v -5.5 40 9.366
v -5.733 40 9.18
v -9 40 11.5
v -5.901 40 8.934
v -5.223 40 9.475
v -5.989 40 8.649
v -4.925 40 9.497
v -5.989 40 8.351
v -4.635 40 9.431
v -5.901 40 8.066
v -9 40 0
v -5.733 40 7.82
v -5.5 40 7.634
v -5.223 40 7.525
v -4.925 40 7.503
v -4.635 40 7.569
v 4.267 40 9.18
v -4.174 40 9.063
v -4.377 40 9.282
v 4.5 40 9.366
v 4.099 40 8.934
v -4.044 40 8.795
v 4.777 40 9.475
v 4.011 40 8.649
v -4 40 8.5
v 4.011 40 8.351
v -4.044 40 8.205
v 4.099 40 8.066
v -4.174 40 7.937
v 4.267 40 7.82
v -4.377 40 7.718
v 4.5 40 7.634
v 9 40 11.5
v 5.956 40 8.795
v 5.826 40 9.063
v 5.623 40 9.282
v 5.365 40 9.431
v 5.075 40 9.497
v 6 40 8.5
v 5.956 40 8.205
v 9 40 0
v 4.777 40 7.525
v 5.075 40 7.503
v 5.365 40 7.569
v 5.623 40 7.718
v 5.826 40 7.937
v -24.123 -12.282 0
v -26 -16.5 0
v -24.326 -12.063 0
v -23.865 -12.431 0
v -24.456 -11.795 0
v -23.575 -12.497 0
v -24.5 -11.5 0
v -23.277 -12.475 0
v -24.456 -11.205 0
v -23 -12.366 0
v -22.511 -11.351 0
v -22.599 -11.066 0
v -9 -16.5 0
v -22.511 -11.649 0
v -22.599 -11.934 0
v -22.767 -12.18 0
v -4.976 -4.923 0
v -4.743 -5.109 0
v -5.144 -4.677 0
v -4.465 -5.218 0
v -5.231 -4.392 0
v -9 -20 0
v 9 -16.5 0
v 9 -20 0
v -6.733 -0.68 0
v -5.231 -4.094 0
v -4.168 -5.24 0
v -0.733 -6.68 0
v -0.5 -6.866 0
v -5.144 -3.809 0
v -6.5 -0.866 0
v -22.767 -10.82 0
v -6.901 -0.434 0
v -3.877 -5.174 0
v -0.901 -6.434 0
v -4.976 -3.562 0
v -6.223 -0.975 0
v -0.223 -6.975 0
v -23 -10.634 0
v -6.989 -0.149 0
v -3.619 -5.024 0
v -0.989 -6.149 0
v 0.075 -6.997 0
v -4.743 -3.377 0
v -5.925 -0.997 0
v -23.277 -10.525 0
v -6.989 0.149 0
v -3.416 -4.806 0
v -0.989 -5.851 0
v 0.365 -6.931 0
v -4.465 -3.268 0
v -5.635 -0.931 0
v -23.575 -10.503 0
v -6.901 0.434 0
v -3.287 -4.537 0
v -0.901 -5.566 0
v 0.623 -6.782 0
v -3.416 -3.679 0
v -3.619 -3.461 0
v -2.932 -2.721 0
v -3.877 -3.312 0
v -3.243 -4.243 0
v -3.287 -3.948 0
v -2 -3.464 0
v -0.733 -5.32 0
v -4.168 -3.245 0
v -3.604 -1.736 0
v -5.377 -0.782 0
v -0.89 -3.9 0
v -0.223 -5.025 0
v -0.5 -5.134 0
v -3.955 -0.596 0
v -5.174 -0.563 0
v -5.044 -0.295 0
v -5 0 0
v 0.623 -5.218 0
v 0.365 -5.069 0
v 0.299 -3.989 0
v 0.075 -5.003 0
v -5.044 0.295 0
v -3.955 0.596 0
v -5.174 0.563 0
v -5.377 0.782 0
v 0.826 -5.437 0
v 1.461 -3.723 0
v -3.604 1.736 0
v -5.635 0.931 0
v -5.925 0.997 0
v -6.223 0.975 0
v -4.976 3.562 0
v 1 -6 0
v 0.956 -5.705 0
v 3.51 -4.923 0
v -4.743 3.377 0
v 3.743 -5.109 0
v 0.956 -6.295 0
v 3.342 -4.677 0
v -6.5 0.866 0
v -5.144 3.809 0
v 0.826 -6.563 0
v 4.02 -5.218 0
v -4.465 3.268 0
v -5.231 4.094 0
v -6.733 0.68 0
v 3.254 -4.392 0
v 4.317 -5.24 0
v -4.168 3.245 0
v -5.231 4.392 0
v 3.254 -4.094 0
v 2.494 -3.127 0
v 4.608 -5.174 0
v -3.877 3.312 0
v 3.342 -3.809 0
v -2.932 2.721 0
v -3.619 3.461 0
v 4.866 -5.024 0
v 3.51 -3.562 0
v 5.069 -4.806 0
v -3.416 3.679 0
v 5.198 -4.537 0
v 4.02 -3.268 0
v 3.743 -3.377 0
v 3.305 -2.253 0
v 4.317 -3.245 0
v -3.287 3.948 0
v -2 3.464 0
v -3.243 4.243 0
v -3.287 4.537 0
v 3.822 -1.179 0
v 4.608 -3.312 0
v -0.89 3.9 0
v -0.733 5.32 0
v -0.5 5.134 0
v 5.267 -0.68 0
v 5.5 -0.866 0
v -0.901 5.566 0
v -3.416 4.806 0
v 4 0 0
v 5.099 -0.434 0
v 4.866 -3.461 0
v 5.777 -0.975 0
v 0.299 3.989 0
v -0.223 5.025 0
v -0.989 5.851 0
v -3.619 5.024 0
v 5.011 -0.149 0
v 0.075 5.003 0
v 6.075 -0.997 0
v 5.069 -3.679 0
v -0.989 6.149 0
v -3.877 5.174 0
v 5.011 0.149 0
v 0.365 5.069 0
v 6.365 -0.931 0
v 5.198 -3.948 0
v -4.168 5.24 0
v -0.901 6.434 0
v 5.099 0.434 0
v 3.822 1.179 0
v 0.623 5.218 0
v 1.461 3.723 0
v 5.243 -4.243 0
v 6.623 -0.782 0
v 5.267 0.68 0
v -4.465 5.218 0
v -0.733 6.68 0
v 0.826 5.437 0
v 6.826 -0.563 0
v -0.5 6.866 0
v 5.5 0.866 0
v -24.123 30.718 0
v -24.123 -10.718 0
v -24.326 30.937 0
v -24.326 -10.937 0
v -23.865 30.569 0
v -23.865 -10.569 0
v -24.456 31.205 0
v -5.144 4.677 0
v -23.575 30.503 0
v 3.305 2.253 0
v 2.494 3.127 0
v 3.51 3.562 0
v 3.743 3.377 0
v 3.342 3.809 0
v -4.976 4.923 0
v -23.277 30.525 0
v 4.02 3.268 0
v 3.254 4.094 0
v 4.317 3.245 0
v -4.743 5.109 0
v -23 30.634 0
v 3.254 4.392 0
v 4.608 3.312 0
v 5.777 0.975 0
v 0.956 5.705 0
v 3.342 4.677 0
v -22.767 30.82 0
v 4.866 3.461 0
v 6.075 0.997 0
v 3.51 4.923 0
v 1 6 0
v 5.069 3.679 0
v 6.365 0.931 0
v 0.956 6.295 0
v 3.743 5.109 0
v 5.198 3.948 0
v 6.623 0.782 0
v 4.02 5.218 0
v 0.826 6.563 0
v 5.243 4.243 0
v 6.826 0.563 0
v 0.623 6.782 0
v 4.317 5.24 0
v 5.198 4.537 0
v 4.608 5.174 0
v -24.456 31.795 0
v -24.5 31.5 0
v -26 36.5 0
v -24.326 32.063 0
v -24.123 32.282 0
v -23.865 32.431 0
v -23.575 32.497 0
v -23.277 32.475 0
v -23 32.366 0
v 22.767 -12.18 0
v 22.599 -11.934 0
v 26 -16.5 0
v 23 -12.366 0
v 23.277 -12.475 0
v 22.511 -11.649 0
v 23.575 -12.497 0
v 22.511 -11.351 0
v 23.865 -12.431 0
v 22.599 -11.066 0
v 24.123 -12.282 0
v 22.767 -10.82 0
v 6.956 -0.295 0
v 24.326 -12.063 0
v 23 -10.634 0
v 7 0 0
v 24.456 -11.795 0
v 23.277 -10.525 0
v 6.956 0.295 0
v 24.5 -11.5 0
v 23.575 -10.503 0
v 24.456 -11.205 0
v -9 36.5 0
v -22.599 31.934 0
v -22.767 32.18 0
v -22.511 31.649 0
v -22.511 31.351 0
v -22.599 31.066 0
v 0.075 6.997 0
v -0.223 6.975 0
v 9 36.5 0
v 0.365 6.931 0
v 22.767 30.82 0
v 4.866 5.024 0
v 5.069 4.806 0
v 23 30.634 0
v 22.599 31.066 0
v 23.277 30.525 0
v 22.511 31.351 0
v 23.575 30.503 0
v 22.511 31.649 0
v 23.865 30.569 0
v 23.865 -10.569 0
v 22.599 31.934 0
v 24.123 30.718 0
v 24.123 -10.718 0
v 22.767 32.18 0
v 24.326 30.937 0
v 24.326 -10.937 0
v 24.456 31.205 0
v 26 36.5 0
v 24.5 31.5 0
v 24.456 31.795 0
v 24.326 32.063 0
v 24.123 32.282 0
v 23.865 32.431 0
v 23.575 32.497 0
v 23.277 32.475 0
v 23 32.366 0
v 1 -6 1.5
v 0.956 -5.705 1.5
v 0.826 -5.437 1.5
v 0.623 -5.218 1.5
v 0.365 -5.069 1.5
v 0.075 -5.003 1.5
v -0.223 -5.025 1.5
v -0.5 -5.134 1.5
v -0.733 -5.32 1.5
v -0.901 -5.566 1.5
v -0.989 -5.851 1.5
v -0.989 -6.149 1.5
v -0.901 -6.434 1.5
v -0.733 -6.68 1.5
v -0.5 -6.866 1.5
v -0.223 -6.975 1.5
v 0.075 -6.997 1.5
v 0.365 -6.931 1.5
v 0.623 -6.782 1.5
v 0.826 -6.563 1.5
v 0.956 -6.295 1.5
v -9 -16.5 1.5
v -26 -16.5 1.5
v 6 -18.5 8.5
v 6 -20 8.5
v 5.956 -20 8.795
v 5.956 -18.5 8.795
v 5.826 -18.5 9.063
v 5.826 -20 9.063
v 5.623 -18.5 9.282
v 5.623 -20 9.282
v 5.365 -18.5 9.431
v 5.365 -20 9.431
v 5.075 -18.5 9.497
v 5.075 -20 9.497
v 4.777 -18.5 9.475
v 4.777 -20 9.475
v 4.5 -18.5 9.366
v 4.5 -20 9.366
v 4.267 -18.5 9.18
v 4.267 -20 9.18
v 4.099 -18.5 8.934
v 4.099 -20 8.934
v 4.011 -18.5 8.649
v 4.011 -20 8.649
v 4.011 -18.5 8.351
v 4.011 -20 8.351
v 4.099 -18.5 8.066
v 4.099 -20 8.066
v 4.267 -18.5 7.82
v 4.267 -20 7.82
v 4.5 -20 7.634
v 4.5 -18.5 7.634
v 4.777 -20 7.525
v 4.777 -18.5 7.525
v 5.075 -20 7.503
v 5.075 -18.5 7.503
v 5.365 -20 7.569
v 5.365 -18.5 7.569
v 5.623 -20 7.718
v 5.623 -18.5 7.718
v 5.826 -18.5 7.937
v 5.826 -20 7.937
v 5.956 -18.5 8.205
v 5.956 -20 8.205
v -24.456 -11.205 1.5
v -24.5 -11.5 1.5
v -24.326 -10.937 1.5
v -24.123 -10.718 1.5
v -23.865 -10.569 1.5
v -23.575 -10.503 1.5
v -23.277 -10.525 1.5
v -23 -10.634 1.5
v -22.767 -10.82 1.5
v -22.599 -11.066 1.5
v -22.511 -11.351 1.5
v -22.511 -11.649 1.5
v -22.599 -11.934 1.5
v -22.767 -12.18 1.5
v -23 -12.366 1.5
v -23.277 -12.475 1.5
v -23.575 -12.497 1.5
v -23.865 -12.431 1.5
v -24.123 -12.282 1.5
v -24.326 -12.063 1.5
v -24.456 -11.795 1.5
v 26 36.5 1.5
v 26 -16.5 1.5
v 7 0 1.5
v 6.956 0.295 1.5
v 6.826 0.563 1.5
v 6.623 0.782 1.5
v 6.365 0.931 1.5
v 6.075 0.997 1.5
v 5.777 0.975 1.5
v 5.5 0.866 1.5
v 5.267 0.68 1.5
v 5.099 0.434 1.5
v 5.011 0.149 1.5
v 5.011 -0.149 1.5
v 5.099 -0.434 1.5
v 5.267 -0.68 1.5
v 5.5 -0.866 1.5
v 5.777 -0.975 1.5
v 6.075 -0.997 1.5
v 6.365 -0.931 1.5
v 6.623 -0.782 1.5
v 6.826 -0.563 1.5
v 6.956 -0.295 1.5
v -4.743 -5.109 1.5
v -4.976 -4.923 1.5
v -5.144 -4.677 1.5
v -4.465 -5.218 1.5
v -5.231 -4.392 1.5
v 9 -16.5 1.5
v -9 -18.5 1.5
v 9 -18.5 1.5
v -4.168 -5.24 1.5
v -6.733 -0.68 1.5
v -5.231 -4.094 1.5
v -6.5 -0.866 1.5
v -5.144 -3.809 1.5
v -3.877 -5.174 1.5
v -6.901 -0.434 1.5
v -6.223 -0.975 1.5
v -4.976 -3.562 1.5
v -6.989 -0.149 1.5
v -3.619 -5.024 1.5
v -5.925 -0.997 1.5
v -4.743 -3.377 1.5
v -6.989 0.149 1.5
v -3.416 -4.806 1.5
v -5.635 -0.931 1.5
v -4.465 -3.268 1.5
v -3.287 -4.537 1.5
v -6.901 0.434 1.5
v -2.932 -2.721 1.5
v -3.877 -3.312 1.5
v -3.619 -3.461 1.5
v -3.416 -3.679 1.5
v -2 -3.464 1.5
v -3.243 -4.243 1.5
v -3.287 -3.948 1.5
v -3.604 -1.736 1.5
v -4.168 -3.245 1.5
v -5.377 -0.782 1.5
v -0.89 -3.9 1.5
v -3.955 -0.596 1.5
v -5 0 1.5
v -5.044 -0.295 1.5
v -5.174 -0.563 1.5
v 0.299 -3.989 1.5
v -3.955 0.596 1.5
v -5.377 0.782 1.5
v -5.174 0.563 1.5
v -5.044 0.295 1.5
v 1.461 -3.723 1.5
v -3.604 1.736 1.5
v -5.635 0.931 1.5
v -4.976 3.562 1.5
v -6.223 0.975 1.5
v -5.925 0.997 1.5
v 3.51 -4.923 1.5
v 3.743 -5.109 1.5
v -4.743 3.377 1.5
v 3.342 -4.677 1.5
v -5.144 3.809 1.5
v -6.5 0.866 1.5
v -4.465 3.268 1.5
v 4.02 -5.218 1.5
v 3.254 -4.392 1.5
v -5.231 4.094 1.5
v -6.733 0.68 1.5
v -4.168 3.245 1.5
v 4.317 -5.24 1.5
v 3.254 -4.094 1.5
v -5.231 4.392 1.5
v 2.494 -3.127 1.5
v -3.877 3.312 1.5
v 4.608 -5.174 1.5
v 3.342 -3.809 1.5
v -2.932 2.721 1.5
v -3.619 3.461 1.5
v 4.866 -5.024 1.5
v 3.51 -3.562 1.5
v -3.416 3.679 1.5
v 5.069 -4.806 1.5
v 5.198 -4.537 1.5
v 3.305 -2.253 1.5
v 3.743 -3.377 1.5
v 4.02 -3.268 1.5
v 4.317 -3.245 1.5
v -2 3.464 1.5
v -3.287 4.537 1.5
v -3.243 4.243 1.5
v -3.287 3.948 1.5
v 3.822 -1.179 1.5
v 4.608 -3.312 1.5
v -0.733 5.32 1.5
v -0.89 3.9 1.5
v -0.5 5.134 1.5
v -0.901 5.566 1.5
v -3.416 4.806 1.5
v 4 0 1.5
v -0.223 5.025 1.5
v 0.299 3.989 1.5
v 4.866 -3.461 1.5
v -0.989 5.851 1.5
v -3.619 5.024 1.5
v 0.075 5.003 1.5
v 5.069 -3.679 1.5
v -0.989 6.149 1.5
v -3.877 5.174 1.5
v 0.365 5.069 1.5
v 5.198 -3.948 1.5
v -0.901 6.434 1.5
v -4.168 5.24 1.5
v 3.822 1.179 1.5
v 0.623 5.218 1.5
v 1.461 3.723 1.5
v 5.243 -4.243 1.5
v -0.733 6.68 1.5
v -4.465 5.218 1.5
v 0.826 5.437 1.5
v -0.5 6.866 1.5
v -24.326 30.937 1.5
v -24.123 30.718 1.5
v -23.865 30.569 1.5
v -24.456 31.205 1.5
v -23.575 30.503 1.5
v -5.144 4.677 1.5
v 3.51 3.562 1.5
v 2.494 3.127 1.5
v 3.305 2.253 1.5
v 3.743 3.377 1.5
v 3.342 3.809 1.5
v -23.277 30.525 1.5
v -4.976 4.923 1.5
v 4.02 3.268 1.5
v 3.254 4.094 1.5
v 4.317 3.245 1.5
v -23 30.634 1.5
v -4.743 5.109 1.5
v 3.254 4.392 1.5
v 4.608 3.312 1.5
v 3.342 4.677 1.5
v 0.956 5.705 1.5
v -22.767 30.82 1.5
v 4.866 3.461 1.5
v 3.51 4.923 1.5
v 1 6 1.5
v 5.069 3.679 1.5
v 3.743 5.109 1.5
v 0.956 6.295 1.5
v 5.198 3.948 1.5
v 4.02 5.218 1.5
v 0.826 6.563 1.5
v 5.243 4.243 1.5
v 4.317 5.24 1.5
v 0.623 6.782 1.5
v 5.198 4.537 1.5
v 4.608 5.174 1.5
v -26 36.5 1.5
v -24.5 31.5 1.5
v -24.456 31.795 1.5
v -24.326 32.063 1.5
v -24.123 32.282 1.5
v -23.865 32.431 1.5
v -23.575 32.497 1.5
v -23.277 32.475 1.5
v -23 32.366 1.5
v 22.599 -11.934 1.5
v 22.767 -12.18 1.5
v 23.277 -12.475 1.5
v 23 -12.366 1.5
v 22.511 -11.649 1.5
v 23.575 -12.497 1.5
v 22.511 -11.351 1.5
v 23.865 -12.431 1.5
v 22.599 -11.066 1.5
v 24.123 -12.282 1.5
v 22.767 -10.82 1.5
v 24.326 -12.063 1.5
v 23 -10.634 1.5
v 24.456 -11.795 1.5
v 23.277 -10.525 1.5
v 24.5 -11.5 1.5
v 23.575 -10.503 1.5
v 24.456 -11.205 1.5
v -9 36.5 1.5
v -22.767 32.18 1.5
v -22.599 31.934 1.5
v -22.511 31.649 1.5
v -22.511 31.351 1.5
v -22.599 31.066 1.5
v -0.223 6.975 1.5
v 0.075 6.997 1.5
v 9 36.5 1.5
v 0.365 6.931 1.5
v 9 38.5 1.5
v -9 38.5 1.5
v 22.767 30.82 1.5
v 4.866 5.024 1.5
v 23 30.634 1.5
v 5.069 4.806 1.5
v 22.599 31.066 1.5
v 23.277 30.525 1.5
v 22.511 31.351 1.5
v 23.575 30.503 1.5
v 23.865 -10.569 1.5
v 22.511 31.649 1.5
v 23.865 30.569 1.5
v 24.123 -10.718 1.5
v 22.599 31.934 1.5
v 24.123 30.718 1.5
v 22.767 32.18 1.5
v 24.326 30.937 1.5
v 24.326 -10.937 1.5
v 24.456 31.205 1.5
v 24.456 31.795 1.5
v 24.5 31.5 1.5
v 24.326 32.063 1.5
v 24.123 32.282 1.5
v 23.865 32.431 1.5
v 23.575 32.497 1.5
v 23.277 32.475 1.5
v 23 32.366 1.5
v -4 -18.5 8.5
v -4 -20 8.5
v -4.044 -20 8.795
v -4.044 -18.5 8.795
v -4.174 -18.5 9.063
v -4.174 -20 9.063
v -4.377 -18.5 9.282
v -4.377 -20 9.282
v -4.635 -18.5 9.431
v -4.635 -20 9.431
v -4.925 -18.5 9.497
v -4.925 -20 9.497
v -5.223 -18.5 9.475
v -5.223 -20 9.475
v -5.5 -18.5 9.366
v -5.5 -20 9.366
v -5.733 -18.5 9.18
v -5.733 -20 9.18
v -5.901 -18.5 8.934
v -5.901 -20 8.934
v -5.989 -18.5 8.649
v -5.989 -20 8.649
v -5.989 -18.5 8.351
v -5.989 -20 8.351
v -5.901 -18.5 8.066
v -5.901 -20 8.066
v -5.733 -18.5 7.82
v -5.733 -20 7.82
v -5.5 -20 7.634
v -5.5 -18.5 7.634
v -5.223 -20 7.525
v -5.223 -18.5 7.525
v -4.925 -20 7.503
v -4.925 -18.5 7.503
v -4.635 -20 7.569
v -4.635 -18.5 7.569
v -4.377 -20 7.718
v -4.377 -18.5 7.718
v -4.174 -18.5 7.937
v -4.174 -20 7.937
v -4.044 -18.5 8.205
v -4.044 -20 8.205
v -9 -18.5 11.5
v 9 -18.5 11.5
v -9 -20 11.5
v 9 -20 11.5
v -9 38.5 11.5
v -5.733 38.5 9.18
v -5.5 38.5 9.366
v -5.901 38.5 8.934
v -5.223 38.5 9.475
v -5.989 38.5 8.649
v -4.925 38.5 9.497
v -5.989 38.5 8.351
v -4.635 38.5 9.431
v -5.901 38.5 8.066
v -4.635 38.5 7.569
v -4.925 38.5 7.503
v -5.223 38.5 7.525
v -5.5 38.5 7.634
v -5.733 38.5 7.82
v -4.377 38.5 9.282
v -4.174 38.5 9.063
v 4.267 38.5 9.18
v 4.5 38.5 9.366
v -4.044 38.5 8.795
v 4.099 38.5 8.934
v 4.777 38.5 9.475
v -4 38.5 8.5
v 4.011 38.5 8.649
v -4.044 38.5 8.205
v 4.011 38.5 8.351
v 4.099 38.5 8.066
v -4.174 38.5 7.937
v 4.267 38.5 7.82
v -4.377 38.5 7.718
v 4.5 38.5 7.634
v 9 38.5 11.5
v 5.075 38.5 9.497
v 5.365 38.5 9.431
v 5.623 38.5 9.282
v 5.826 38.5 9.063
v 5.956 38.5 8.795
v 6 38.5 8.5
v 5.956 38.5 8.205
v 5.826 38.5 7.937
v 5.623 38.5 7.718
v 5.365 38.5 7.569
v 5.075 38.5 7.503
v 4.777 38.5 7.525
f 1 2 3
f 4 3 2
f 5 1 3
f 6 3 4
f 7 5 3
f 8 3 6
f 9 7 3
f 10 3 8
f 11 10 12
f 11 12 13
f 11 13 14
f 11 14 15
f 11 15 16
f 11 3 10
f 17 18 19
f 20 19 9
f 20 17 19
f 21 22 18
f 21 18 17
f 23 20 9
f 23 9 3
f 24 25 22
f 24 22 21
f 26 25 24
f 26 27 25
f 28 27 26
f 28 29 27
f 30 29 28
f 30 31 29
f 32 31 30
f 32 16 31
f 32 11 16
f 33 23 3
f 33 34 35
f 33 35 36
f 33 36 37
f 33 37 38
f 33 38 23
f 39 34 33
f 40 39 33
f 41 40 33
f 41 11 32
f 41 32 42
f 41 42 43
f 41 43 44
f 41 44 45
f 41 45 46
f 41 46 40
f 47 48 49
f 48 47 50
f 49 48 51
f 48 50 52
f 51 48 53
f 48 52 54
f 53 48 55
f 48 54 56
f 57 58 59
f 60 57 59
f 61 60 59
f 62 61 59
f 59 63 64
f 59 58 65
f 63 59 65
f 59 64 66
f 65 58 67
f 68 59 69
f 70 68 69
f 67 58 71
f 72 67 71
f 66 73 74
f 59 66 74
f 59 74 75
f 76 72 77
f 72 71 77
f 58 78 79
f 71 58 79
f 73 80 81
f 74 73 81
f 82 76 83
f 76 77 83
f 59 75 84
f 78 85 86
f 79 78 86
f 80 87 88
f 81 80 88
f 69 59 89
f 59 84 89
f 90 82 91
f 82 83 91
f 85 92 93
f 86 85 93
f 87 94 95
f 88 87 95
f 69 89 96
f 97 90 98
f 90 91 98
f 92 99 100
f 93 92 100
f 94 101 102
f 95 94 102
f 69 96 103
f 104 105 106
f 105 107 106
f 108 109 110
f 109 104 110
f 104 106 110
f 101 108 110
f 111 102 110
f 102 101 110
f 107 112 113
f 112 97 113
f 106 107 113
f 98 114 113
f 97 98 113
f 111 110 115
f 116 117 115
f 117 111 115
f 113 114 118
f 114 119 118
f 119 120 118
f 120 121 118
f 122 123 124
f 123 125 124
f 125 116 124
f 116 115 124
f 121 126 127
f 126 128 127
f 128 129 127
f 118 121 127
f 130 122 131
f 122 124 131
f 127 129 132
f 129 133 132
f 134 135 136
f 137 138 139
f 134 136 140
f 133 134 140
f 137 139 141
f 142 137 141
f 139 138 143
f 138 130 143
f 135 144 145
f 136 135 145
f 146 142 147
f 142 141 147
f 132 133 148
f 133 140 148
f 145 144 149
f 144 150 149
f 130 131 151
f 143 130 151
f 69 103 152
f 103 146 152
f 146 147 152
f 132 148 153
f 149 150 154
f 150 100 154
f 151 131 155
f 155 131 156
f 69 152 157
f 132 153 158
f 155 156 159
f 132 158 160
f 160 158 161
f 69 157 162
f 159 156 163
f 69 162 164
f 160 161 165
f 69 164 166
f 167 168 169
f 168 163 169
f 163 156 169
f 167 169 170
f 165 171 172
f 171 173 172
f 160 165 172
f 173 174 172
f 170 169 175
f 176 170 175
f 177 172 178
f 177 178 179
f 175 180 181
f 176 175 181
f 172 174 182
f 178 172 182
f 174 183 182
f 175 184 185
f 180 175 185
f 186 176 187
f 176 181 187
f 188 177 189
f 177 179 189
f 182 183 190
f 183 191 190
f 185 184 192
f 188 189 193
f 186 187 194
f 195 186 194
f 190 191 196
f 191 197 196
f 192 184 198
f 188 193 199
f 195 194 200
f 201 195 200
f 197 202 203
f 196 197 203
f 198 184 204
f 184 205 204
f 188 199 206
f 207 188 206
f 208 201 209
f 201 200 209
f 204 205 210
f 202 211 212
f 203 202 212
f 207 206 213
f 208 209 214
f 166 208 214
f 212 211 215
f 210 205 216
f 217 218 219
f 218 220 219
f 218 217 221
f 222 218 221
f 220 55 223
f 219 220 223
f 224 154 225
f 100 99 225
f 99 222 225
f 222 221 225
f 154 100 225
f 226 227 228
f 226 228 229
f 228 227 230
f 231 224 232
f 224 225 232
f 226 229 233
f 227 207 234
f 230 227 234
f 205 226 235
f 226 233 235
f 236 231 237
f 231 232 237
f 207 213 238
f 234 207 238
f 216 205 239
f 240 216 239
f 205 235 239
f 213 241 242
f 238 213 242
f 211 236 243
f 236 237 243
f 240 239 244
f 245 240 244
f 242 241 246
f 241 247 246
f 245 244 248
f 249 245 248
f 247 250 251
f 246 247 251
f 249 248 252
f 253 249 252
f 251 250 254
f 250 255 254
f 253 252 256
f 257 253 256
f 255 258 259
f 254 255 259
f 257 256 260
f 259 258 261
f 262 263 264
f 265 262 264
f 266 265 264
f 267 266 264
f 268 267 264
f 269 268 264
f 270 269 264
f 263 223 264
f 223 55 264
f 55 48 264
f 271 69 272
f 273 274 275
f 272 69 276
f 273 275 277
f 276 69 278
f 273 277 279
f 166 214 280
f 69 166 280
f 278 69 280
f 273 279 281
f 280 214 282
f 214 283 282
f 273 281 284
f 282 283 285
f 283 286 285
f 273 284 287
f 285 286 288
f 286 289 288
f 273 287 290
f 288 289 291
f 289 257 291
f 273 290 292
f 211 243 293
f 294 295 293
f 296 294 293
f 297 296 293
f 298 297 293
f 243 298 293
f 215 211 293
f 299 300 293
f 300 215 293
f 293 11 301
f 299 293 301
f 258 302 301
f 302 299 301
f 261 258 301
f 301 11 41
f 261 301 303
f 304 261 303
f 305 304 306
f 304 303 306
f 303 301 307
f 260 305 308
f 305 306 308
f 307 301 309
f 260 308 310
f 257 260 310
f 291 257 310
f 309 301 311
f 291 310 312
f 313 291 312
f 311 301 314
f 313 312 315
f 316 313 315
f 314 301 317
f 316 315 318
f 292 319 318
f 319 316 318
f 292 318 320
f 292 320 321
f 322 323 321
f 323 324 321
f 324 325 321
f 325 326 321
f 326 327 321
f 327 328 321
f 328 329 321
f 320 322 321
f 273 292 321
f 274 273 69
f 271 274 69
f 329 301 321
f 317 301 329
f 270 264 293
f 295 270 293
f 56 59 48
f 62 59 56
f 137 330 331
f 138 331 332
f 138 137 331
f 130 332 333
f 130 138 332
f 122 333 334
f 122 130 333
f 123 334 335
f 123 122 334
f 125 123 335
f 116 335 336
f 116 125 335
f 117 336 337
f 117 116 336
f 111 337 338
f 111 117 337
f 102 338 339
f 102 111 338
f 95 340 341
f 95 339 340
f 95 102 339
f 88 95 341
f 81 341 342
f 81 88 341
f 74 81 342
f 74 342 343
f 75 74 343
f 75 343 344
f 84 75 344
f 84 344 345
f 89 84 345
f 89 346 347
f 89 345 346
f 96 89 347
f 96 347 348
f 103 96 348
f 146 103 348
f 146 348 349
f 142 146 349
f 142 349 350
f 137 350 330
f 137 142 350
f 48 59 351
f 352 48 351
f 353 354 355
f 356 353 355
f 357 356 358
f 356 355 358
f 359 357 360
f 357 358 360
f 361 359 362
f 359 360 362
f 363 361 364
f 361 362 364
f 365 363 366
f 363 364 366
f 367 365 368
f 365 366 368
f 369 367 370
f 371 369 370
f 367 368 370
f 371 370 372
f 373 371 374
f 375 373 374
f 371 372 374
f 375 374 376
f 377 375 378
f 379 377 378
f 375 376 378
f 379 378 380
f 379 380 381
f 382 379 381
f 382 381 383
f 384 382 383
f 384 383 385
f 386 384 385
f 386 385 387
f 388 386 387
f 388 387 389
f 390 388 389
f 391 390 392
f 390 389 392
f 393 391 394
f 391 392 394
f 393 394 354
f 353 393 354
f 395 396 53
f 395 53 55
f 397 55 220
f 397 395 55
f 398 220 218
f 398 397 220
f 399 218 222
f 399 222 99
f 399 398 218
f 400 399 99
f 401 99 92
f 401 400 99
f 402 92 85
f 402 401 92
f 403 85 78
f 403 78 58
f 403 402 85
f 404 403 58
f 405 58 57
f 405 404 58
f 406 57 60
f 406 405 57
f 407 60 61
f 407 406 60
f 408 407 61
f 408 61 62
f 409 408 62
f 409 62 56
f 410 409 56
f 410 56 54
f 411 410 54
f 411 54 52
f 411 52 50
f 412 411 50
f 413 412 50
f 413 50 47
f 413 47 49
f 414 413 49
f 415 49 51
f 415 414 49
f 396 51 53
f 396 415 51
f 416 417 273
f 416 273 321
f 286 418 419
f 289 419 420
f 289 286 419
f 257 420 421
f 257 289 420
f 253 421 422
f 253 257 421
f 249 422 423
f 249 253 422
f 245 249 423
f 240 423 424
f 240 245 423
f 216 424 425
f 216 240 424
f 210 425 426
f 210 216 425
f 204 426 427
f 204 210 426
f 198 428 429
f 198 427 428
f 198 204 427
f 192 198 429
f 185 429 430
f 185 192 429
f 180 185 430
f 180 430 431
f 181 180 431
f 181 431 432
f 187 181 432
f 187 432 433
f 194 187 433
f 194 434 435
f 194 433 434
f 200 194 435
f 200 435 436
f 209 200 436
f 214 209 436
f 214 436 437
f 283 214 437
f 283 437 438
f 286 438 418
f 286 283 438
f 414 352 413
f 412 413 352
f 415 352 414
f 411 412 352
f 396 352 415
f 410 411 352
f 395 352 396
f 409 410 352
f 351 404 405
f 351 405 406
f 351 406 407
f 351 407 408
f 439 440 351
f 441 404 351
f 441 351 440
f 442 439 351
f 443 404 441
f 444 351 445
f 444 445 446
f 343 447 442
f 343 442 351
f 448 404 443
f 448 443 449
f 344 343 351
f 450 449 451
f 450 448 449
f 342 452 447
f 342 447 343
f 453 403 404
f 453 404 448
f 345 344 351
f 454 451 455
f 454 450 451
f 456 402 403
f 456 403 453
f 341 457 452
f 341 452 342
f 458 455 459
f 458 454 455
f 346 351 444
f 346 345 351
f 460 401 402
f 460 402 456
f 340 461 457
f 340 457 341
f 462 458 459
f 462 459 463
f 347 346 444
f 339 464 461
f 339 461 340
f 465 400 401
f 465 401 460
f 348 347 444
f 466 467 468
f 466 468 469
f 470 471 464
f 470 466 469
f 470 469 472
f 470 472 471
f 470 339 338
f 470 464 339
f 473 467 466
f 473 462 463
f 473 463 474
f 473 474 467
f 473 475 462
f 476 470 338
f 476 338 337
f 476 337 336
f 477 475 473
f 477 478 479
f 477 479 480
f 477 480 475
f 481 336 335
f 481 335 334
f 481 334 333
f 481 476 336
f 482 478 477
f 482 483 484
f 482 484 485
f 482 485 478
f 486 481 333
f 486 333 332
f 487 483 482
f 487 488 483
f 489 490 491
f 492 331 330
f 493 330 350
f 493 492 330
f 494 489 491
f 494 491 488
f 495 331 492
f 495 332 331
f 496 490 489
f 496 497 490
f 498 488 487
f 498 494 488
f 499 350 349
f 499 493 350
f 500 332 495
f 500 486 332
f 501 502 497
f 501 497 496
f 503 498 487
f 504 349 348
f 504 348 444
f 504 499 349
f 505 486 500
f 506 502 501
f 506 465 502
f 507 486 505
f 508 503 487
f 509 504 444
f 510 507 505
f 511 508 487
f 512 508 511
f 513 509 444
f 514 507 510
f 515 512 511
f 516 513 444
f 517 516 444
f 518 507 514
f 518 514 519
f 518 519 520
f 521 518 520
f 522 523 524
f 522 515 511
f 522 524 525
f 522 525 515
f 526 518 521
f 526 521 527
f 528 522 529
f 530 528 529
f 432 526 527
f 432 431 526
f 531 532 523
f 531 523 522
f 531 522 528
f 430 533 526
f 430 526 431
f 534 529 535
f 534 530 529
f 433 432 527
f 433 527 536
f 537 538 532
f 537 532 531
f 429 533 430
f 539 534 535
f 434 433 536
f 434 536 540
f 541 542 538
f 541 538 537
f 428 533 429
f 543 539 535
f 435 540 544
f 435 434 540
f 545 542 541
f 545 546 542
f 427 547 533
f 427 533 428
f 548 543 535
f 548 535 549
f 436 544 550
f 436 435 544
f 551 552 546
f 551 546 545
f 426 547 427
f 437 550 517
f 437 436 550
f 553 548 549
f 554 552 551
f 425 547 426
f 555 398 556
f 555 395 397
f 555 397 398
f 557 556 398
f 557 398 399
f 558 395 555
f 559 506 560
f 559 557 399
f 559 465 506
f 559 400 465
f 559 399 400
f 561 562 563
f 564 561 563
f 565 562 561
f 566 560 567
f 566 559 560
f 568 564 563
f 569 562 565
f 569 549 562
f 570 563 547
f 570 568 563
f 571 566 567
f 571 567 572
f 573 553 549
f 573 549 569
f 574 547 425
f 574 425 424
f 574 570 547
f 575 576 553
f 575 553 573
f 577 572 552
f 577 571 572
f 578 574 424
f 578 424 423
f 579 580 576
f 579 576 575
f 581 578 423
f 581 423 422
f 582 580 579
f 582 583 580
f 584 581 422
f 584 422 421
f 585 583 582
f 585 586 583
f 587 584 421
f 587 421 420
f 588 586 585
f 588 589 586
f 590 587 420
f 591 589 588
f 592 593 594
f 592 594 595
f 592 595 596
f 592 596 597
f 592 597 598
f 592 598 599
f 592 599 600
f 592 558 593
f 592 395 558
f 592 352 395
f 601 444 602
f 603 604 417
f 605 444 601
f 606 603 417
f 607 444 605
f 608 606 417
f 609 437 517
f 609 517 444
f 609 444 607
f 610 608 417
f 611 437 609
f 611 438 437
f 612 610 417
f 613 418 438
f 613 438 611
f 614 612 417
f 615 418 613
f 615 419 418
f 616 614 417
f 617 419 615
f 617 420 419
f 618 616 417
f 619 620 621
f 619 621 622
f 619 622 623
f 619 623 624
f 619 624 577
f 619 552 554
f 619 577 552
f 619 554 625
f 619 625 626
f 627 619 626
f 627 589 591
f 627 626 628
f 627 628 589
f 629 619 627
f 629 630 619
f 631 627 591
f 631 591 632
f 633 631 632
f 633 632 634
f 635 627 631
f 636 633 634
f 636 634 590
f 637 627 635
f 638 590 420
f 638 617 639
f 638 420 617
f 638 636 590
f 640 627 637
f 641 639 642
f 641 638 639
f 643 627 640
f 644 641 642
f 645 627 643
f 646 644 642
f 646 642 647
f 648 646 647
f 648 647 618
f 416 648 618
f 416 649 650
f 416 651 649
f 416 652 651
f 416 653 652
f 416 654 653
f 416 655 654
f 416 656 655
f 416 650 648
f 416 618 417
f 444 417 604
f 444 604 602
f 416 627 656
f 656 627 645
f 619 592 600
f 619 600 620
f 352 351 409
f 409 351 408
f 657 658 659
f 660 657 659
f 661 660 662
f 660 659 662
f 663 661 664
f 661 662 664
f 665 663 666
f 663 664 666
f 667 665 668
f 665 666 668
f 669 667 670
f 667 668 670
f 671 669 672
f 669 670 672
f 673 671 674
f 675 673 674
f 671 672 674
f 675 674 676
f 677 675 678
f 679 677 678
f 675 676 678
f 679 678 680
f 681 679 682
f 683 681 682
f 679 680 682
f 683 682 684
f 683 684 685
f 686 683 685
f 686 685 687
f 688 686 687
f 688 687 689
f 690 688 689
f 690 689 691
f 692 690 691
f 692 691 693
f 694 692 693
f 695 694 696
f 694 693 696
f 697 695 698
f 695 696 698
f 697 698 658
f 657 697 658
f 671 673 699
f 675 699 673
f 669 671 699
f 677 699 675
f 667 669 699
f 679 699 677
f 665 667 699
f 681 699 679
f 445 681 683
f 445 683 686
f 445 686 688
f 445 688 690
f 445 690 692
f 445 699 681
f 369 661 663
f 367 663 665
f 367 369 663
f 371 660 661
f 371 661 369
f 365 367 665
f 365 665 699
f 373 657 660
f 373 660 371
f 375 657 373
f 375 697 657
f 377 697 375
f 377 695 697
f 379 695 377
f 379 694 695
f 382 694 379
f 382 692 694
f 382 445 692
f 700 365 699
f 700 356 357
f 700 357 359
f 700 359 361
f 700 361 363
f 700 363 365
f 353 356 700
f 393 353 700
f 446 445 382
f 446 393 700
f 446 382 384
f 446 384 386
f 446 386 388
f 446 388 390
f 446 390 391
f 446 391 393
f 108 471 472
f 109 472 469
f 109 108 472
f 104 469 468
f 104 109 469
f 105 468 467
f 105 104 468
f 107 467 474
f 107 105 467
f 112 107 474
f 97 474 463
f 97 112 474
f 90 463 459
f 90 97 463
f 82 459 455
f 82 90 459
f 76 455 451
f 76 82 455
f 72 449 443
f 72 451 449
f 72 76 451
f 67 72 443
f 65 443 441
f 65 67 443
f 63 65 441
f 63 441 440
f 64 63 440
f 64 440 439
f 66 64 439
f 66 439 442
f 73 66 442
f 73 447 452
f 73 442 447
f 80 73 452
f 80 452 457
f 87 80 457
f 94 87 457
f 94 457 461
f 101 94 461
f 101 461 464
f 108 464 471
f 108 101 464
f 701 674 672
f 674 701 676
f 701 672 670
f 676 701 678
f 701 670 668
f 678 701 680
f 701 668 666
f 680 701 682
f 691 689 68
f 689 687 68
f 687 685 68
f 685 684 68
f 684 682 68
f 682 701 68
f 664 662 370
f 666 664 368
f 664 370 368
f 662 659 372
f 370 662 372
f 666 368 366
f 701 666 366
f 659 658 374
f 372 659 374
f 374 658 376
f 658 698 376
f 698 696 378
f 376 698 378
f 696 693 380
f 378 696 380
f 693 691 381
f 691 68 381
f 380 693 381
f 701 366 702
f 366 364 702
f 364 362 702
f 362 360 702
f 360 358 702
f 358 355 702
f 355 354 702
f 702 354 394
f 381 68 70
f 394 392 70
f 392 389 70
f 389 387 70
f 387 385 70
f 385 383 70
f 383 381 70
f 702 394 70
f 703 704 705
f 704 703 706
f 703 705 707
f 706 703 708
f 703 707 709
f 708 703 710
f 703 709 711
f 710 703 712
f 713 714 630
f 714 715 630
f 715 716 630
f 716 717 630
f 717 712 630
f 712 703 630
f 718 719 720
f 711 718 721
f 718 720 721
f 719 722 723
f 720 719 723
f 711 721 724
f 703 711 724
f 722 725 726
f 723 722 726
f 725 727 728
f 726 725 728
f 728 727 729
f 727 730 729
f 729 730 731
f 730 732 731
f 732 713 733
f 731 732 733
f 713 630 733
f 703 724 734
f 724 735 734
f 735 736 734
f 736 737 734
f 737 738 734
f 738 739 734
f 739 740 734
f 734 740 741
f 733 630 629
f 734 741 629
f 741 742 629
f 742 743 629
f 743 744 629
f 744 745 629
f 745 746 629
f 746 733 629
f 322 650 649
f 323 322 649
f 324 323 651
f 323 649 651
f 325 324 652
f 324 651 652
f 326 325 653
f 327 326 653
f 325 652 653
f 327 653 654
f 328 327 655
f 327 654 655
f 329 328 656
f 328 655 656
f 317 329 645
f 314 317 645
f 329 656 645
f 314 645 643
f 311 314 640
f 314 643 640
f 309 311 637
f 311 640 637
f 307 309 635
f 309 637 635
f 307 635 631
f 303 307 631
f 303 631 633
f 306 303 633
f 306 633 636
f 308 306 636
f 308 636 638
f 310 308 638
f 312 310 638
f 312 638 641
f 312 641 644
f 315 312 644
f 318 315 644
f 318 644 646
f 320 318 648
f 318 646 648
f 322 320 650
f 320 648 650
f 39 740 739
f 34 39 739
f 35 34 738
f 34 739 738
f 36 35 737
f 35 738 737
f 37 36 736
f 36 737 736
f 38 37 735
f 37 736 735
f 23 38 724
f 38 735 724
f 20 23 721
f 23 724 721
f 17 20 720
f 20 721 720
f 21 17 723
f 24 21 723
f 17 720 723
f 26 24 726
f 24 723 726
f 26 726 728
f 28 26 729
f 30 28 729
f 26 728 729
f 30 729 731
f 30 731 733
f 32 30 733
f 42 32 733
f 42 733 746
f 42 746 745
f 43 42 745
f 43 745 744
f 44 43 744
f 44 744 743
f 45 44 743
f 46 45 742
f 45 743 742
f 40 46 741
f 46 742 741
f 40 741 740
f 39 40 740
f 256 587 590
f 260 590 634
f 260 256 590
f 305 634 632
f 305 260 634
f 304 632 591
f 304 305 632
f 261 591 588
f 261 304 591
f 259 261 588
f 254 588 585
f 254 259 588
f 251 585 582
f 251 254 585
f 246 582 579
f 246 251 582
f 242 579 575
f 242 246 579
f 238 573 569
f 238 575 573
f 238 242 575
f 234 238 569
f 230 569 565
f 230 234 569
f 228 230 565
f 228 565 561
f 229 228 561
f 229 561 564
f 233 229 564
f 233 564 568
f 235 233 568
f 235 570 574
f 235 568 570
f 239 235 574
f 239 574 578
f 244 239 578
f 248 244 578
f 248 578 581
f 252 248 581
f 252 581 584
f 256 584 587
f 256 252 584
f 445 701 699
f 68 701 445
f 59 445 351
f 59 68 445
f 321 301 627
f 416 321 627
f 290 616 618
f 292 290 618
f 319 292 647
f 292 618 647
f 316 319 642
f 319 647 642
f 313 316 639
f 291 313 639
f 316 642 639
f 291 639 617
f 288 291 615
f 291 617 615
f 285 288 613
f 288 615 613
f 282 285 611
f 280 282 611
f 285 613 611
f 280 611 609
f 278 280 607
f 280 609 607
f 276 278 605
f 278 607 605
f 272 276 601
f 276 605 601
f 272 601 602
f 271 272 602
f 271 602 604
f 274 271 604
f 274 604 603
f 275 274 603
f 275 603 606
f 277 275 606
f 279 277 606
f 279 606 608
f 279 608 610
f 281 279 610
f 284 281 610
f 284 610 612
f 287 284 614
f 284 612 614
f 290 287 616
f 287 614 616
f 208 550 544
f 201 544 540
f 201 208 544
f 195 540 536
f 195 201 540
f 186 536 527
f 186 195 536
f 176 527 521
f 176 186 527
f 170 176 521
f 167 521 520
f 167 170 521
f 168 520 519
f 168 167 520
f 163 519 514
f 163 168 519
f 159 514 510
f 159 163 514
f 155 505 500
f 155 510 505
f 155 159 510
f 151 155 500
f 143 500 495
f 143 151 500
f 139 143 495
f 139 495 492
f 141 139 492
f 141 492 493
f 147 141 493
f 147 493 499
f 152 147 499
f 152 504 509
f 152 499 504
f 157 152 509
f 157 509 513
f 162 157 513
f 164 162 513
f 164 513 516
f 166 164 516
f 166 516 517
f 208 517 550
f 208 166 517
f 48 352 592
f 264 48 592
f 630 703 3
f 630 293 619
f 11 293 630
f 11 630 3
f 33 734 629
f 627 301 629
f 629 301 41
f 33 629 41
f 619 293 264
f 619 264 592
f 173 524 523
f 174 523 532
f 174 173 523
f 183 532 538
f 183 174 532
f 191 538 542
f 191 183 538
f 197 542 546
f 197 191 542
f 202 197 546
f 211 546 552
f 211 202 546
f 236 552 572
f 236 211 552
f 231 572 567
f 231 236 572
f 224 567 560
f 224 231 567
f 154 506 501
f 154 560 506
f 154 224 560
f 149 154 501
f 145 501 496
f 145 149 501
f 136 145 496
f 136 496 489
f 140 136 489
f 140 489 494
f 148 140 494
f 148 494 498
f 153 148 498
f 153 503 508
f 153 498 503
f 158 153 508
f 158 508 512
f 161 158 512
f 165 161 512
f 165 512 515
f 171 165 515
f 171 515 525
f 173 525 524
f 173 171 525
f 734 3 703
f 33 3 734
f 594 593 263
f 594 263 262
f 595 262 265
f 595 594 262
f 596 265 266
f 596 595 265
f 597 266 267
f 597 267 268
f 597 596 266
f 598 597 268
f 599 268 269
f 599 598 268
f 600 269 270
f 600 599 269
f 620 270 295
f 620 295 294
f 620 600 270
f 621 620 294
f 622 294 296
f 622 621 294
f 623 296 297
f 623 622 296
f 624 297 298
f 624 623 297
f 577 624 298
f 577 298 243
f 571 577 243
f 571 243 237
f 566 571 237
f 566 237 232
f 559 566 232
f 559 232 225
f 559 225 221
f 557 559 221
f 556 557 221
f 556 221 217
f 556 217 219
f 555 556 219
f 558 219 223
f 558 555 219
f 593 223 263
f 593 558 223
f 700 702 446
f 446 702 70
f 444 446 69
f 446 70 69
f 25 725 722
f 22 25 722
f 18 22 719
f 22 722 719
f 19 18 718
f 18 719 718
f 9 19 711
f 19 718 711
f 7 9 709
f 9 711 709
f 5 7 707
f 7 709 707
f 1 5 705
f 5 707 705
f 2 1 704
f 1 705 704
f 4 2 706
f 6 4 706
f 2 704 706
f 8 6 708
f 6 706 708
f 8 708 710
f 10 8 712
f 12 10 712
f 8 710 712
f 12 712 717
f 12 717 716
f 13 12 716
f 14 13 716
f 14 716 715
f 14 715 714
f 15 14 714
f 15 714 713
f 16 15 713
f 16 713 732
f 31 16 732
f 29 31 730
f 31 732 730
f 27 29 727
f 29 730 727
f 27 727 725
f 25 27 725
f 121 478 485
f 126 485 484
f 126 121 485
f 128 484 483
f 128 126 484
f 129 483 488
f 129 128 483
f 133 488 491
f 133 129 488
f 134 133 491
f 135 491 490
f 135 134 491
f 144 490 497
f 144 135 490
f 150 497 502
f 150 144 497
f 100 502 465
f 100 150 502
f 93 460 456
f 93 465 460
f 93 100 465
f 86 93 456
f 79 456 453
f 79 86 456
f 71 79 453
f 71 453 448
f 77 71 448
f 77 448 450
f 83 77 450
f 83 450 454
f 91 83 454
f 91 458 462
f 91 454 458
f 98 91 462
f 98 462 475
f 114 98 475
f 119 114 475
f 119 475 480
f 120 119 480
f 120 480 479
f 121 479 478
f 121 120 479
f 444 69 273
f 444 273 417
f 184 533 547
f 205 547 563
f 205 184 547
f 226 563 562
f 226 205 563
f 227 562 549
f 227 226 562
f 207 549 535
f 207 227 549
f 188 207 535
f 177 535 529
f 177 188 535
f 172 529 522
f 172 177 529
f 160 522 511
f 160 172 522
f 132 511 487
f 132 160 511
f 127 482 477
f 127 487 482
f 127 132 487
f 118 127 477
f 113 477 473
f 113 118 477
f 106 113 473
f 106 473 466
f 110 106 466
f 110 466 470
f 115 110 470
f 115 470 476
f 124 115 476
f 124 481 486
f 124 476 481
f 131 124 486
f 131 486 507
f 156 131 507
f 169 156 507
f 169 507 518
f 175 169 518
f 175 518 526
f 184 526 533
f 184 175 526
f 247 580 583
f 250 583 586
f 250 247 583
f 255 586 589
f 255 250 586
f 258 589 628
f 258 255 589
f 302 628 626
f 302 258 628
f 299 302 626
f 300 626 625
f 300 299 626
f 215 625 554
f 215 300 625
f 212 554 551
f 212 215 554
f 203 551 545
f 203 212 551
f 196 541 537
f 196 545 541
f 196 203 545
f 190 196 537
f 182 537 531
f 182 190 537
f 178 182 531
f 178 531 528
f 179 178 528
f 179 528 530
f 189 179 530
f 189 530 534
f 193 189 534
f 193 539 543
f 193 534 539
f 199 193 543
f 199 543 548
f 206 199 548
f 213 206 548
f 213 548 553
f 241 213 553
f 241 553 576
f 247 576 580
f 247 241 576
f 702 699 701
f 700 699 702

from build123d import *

# Parameters (mm, degrees)
F0_W     = 18
F0_H     = 60
F0_R     = 1
F0_R_2   = 4
F1_DEPTH = 1.5
F2_W     = 18
F2_H     = 1.5
F3_DEPTH = 10
F4_R     = 1
F5_DEPTH = 60.001
F6_W     = 53
F6_H     = 1.5
F7_DEPTH = 17
F8_R     = 1
F9_DEPTH = 1.5


with BuildPart() as f1:
    # F0 (on Top) → F1 (new body)
    with BuildSketch(Plane.XY):
        with Locations((0, 10)):
            Rectangle(F0_W, F0_H)
        with Locations((-6, 0)):
            Circle(F0_R, mode=Mode.SUBTRACT)
        with Locations((-4.242641, -4.242641)):
            Circle(F0_R, mode=Mode.SUBTRACT)
        with Locations((-4.242641, 4.242641)):
            Circle(F0_R, mode=Mode.SUBTRACT)
        with Locations((0, -6)):
            Circle(F0_R, mode=Mode.SUBTRACT)
        Circle(F0_R_2, mode=Mode.SUBTRACT)
        with Locations((4.242641, -4.242641)):
            Circle(F0_R, mode=Mode.SUBTRACT)
        with Locations((0, 6)):
            Circle(F0_R, mode=Mode.SUBTRACT)
        with Locations((4.242641, 4.242641)):
            Circle(F0_R, mode=Mode.SUBTRACT)
        with Locations((6, 0)):
            Circle(F0_R, mode=Mode.SUBTRACT)
    extrude(amount=F1_DEPTH)

    # F2 (on face) → F3 (join)
    with BuildSketch(Plane.XY.offset(1.5)):
        with Locations((0, 39.25)):
            Rectangle(F2_W, F2_H)
        with Locations((0, -19.25)):
            Rectangle(F2_W, F2_H)
    extrude(amount=F3_DEPTH)

    # F4 (on face) → F5 (cut, through all)
    with BuildSketch(Plane.XZ.offset(20)):
        with Locations((5, 8.5)):
            Circle(F4_R)
        with Locations((-5, 8.5)):
            Circle(F4_R)
    extrude(amount=-F5_DEPTH, mode=Mode.SUBTRACT)

    # F6 (on face) → F7 (join)
    with BuildSketch(Plane.YZ.offset(9)):
        with Locations((10, 0.75)):
            Rectangle(F6_W, F6_H)
    extrude(amount=F7_DEPTH)

    # F8 (on face) → F9 (cut, through all)
    with BuildSketch(Plane.XY.offset(1.5)):
        with Locations((23.5, 31.5)):
            Circle(F8_R)
        with Locations((23.5, -11.5)):
            Circle(F8_R)
    extrude(amount=-F9_DEPTH, mode=Mode.SUBTRACT)

    # F10: F1 across plane


with BuildPart() as f1_1:
    add(f1.part)
    add(f1.part.mirror(Plane.YZ))


solid = f1_1.part
